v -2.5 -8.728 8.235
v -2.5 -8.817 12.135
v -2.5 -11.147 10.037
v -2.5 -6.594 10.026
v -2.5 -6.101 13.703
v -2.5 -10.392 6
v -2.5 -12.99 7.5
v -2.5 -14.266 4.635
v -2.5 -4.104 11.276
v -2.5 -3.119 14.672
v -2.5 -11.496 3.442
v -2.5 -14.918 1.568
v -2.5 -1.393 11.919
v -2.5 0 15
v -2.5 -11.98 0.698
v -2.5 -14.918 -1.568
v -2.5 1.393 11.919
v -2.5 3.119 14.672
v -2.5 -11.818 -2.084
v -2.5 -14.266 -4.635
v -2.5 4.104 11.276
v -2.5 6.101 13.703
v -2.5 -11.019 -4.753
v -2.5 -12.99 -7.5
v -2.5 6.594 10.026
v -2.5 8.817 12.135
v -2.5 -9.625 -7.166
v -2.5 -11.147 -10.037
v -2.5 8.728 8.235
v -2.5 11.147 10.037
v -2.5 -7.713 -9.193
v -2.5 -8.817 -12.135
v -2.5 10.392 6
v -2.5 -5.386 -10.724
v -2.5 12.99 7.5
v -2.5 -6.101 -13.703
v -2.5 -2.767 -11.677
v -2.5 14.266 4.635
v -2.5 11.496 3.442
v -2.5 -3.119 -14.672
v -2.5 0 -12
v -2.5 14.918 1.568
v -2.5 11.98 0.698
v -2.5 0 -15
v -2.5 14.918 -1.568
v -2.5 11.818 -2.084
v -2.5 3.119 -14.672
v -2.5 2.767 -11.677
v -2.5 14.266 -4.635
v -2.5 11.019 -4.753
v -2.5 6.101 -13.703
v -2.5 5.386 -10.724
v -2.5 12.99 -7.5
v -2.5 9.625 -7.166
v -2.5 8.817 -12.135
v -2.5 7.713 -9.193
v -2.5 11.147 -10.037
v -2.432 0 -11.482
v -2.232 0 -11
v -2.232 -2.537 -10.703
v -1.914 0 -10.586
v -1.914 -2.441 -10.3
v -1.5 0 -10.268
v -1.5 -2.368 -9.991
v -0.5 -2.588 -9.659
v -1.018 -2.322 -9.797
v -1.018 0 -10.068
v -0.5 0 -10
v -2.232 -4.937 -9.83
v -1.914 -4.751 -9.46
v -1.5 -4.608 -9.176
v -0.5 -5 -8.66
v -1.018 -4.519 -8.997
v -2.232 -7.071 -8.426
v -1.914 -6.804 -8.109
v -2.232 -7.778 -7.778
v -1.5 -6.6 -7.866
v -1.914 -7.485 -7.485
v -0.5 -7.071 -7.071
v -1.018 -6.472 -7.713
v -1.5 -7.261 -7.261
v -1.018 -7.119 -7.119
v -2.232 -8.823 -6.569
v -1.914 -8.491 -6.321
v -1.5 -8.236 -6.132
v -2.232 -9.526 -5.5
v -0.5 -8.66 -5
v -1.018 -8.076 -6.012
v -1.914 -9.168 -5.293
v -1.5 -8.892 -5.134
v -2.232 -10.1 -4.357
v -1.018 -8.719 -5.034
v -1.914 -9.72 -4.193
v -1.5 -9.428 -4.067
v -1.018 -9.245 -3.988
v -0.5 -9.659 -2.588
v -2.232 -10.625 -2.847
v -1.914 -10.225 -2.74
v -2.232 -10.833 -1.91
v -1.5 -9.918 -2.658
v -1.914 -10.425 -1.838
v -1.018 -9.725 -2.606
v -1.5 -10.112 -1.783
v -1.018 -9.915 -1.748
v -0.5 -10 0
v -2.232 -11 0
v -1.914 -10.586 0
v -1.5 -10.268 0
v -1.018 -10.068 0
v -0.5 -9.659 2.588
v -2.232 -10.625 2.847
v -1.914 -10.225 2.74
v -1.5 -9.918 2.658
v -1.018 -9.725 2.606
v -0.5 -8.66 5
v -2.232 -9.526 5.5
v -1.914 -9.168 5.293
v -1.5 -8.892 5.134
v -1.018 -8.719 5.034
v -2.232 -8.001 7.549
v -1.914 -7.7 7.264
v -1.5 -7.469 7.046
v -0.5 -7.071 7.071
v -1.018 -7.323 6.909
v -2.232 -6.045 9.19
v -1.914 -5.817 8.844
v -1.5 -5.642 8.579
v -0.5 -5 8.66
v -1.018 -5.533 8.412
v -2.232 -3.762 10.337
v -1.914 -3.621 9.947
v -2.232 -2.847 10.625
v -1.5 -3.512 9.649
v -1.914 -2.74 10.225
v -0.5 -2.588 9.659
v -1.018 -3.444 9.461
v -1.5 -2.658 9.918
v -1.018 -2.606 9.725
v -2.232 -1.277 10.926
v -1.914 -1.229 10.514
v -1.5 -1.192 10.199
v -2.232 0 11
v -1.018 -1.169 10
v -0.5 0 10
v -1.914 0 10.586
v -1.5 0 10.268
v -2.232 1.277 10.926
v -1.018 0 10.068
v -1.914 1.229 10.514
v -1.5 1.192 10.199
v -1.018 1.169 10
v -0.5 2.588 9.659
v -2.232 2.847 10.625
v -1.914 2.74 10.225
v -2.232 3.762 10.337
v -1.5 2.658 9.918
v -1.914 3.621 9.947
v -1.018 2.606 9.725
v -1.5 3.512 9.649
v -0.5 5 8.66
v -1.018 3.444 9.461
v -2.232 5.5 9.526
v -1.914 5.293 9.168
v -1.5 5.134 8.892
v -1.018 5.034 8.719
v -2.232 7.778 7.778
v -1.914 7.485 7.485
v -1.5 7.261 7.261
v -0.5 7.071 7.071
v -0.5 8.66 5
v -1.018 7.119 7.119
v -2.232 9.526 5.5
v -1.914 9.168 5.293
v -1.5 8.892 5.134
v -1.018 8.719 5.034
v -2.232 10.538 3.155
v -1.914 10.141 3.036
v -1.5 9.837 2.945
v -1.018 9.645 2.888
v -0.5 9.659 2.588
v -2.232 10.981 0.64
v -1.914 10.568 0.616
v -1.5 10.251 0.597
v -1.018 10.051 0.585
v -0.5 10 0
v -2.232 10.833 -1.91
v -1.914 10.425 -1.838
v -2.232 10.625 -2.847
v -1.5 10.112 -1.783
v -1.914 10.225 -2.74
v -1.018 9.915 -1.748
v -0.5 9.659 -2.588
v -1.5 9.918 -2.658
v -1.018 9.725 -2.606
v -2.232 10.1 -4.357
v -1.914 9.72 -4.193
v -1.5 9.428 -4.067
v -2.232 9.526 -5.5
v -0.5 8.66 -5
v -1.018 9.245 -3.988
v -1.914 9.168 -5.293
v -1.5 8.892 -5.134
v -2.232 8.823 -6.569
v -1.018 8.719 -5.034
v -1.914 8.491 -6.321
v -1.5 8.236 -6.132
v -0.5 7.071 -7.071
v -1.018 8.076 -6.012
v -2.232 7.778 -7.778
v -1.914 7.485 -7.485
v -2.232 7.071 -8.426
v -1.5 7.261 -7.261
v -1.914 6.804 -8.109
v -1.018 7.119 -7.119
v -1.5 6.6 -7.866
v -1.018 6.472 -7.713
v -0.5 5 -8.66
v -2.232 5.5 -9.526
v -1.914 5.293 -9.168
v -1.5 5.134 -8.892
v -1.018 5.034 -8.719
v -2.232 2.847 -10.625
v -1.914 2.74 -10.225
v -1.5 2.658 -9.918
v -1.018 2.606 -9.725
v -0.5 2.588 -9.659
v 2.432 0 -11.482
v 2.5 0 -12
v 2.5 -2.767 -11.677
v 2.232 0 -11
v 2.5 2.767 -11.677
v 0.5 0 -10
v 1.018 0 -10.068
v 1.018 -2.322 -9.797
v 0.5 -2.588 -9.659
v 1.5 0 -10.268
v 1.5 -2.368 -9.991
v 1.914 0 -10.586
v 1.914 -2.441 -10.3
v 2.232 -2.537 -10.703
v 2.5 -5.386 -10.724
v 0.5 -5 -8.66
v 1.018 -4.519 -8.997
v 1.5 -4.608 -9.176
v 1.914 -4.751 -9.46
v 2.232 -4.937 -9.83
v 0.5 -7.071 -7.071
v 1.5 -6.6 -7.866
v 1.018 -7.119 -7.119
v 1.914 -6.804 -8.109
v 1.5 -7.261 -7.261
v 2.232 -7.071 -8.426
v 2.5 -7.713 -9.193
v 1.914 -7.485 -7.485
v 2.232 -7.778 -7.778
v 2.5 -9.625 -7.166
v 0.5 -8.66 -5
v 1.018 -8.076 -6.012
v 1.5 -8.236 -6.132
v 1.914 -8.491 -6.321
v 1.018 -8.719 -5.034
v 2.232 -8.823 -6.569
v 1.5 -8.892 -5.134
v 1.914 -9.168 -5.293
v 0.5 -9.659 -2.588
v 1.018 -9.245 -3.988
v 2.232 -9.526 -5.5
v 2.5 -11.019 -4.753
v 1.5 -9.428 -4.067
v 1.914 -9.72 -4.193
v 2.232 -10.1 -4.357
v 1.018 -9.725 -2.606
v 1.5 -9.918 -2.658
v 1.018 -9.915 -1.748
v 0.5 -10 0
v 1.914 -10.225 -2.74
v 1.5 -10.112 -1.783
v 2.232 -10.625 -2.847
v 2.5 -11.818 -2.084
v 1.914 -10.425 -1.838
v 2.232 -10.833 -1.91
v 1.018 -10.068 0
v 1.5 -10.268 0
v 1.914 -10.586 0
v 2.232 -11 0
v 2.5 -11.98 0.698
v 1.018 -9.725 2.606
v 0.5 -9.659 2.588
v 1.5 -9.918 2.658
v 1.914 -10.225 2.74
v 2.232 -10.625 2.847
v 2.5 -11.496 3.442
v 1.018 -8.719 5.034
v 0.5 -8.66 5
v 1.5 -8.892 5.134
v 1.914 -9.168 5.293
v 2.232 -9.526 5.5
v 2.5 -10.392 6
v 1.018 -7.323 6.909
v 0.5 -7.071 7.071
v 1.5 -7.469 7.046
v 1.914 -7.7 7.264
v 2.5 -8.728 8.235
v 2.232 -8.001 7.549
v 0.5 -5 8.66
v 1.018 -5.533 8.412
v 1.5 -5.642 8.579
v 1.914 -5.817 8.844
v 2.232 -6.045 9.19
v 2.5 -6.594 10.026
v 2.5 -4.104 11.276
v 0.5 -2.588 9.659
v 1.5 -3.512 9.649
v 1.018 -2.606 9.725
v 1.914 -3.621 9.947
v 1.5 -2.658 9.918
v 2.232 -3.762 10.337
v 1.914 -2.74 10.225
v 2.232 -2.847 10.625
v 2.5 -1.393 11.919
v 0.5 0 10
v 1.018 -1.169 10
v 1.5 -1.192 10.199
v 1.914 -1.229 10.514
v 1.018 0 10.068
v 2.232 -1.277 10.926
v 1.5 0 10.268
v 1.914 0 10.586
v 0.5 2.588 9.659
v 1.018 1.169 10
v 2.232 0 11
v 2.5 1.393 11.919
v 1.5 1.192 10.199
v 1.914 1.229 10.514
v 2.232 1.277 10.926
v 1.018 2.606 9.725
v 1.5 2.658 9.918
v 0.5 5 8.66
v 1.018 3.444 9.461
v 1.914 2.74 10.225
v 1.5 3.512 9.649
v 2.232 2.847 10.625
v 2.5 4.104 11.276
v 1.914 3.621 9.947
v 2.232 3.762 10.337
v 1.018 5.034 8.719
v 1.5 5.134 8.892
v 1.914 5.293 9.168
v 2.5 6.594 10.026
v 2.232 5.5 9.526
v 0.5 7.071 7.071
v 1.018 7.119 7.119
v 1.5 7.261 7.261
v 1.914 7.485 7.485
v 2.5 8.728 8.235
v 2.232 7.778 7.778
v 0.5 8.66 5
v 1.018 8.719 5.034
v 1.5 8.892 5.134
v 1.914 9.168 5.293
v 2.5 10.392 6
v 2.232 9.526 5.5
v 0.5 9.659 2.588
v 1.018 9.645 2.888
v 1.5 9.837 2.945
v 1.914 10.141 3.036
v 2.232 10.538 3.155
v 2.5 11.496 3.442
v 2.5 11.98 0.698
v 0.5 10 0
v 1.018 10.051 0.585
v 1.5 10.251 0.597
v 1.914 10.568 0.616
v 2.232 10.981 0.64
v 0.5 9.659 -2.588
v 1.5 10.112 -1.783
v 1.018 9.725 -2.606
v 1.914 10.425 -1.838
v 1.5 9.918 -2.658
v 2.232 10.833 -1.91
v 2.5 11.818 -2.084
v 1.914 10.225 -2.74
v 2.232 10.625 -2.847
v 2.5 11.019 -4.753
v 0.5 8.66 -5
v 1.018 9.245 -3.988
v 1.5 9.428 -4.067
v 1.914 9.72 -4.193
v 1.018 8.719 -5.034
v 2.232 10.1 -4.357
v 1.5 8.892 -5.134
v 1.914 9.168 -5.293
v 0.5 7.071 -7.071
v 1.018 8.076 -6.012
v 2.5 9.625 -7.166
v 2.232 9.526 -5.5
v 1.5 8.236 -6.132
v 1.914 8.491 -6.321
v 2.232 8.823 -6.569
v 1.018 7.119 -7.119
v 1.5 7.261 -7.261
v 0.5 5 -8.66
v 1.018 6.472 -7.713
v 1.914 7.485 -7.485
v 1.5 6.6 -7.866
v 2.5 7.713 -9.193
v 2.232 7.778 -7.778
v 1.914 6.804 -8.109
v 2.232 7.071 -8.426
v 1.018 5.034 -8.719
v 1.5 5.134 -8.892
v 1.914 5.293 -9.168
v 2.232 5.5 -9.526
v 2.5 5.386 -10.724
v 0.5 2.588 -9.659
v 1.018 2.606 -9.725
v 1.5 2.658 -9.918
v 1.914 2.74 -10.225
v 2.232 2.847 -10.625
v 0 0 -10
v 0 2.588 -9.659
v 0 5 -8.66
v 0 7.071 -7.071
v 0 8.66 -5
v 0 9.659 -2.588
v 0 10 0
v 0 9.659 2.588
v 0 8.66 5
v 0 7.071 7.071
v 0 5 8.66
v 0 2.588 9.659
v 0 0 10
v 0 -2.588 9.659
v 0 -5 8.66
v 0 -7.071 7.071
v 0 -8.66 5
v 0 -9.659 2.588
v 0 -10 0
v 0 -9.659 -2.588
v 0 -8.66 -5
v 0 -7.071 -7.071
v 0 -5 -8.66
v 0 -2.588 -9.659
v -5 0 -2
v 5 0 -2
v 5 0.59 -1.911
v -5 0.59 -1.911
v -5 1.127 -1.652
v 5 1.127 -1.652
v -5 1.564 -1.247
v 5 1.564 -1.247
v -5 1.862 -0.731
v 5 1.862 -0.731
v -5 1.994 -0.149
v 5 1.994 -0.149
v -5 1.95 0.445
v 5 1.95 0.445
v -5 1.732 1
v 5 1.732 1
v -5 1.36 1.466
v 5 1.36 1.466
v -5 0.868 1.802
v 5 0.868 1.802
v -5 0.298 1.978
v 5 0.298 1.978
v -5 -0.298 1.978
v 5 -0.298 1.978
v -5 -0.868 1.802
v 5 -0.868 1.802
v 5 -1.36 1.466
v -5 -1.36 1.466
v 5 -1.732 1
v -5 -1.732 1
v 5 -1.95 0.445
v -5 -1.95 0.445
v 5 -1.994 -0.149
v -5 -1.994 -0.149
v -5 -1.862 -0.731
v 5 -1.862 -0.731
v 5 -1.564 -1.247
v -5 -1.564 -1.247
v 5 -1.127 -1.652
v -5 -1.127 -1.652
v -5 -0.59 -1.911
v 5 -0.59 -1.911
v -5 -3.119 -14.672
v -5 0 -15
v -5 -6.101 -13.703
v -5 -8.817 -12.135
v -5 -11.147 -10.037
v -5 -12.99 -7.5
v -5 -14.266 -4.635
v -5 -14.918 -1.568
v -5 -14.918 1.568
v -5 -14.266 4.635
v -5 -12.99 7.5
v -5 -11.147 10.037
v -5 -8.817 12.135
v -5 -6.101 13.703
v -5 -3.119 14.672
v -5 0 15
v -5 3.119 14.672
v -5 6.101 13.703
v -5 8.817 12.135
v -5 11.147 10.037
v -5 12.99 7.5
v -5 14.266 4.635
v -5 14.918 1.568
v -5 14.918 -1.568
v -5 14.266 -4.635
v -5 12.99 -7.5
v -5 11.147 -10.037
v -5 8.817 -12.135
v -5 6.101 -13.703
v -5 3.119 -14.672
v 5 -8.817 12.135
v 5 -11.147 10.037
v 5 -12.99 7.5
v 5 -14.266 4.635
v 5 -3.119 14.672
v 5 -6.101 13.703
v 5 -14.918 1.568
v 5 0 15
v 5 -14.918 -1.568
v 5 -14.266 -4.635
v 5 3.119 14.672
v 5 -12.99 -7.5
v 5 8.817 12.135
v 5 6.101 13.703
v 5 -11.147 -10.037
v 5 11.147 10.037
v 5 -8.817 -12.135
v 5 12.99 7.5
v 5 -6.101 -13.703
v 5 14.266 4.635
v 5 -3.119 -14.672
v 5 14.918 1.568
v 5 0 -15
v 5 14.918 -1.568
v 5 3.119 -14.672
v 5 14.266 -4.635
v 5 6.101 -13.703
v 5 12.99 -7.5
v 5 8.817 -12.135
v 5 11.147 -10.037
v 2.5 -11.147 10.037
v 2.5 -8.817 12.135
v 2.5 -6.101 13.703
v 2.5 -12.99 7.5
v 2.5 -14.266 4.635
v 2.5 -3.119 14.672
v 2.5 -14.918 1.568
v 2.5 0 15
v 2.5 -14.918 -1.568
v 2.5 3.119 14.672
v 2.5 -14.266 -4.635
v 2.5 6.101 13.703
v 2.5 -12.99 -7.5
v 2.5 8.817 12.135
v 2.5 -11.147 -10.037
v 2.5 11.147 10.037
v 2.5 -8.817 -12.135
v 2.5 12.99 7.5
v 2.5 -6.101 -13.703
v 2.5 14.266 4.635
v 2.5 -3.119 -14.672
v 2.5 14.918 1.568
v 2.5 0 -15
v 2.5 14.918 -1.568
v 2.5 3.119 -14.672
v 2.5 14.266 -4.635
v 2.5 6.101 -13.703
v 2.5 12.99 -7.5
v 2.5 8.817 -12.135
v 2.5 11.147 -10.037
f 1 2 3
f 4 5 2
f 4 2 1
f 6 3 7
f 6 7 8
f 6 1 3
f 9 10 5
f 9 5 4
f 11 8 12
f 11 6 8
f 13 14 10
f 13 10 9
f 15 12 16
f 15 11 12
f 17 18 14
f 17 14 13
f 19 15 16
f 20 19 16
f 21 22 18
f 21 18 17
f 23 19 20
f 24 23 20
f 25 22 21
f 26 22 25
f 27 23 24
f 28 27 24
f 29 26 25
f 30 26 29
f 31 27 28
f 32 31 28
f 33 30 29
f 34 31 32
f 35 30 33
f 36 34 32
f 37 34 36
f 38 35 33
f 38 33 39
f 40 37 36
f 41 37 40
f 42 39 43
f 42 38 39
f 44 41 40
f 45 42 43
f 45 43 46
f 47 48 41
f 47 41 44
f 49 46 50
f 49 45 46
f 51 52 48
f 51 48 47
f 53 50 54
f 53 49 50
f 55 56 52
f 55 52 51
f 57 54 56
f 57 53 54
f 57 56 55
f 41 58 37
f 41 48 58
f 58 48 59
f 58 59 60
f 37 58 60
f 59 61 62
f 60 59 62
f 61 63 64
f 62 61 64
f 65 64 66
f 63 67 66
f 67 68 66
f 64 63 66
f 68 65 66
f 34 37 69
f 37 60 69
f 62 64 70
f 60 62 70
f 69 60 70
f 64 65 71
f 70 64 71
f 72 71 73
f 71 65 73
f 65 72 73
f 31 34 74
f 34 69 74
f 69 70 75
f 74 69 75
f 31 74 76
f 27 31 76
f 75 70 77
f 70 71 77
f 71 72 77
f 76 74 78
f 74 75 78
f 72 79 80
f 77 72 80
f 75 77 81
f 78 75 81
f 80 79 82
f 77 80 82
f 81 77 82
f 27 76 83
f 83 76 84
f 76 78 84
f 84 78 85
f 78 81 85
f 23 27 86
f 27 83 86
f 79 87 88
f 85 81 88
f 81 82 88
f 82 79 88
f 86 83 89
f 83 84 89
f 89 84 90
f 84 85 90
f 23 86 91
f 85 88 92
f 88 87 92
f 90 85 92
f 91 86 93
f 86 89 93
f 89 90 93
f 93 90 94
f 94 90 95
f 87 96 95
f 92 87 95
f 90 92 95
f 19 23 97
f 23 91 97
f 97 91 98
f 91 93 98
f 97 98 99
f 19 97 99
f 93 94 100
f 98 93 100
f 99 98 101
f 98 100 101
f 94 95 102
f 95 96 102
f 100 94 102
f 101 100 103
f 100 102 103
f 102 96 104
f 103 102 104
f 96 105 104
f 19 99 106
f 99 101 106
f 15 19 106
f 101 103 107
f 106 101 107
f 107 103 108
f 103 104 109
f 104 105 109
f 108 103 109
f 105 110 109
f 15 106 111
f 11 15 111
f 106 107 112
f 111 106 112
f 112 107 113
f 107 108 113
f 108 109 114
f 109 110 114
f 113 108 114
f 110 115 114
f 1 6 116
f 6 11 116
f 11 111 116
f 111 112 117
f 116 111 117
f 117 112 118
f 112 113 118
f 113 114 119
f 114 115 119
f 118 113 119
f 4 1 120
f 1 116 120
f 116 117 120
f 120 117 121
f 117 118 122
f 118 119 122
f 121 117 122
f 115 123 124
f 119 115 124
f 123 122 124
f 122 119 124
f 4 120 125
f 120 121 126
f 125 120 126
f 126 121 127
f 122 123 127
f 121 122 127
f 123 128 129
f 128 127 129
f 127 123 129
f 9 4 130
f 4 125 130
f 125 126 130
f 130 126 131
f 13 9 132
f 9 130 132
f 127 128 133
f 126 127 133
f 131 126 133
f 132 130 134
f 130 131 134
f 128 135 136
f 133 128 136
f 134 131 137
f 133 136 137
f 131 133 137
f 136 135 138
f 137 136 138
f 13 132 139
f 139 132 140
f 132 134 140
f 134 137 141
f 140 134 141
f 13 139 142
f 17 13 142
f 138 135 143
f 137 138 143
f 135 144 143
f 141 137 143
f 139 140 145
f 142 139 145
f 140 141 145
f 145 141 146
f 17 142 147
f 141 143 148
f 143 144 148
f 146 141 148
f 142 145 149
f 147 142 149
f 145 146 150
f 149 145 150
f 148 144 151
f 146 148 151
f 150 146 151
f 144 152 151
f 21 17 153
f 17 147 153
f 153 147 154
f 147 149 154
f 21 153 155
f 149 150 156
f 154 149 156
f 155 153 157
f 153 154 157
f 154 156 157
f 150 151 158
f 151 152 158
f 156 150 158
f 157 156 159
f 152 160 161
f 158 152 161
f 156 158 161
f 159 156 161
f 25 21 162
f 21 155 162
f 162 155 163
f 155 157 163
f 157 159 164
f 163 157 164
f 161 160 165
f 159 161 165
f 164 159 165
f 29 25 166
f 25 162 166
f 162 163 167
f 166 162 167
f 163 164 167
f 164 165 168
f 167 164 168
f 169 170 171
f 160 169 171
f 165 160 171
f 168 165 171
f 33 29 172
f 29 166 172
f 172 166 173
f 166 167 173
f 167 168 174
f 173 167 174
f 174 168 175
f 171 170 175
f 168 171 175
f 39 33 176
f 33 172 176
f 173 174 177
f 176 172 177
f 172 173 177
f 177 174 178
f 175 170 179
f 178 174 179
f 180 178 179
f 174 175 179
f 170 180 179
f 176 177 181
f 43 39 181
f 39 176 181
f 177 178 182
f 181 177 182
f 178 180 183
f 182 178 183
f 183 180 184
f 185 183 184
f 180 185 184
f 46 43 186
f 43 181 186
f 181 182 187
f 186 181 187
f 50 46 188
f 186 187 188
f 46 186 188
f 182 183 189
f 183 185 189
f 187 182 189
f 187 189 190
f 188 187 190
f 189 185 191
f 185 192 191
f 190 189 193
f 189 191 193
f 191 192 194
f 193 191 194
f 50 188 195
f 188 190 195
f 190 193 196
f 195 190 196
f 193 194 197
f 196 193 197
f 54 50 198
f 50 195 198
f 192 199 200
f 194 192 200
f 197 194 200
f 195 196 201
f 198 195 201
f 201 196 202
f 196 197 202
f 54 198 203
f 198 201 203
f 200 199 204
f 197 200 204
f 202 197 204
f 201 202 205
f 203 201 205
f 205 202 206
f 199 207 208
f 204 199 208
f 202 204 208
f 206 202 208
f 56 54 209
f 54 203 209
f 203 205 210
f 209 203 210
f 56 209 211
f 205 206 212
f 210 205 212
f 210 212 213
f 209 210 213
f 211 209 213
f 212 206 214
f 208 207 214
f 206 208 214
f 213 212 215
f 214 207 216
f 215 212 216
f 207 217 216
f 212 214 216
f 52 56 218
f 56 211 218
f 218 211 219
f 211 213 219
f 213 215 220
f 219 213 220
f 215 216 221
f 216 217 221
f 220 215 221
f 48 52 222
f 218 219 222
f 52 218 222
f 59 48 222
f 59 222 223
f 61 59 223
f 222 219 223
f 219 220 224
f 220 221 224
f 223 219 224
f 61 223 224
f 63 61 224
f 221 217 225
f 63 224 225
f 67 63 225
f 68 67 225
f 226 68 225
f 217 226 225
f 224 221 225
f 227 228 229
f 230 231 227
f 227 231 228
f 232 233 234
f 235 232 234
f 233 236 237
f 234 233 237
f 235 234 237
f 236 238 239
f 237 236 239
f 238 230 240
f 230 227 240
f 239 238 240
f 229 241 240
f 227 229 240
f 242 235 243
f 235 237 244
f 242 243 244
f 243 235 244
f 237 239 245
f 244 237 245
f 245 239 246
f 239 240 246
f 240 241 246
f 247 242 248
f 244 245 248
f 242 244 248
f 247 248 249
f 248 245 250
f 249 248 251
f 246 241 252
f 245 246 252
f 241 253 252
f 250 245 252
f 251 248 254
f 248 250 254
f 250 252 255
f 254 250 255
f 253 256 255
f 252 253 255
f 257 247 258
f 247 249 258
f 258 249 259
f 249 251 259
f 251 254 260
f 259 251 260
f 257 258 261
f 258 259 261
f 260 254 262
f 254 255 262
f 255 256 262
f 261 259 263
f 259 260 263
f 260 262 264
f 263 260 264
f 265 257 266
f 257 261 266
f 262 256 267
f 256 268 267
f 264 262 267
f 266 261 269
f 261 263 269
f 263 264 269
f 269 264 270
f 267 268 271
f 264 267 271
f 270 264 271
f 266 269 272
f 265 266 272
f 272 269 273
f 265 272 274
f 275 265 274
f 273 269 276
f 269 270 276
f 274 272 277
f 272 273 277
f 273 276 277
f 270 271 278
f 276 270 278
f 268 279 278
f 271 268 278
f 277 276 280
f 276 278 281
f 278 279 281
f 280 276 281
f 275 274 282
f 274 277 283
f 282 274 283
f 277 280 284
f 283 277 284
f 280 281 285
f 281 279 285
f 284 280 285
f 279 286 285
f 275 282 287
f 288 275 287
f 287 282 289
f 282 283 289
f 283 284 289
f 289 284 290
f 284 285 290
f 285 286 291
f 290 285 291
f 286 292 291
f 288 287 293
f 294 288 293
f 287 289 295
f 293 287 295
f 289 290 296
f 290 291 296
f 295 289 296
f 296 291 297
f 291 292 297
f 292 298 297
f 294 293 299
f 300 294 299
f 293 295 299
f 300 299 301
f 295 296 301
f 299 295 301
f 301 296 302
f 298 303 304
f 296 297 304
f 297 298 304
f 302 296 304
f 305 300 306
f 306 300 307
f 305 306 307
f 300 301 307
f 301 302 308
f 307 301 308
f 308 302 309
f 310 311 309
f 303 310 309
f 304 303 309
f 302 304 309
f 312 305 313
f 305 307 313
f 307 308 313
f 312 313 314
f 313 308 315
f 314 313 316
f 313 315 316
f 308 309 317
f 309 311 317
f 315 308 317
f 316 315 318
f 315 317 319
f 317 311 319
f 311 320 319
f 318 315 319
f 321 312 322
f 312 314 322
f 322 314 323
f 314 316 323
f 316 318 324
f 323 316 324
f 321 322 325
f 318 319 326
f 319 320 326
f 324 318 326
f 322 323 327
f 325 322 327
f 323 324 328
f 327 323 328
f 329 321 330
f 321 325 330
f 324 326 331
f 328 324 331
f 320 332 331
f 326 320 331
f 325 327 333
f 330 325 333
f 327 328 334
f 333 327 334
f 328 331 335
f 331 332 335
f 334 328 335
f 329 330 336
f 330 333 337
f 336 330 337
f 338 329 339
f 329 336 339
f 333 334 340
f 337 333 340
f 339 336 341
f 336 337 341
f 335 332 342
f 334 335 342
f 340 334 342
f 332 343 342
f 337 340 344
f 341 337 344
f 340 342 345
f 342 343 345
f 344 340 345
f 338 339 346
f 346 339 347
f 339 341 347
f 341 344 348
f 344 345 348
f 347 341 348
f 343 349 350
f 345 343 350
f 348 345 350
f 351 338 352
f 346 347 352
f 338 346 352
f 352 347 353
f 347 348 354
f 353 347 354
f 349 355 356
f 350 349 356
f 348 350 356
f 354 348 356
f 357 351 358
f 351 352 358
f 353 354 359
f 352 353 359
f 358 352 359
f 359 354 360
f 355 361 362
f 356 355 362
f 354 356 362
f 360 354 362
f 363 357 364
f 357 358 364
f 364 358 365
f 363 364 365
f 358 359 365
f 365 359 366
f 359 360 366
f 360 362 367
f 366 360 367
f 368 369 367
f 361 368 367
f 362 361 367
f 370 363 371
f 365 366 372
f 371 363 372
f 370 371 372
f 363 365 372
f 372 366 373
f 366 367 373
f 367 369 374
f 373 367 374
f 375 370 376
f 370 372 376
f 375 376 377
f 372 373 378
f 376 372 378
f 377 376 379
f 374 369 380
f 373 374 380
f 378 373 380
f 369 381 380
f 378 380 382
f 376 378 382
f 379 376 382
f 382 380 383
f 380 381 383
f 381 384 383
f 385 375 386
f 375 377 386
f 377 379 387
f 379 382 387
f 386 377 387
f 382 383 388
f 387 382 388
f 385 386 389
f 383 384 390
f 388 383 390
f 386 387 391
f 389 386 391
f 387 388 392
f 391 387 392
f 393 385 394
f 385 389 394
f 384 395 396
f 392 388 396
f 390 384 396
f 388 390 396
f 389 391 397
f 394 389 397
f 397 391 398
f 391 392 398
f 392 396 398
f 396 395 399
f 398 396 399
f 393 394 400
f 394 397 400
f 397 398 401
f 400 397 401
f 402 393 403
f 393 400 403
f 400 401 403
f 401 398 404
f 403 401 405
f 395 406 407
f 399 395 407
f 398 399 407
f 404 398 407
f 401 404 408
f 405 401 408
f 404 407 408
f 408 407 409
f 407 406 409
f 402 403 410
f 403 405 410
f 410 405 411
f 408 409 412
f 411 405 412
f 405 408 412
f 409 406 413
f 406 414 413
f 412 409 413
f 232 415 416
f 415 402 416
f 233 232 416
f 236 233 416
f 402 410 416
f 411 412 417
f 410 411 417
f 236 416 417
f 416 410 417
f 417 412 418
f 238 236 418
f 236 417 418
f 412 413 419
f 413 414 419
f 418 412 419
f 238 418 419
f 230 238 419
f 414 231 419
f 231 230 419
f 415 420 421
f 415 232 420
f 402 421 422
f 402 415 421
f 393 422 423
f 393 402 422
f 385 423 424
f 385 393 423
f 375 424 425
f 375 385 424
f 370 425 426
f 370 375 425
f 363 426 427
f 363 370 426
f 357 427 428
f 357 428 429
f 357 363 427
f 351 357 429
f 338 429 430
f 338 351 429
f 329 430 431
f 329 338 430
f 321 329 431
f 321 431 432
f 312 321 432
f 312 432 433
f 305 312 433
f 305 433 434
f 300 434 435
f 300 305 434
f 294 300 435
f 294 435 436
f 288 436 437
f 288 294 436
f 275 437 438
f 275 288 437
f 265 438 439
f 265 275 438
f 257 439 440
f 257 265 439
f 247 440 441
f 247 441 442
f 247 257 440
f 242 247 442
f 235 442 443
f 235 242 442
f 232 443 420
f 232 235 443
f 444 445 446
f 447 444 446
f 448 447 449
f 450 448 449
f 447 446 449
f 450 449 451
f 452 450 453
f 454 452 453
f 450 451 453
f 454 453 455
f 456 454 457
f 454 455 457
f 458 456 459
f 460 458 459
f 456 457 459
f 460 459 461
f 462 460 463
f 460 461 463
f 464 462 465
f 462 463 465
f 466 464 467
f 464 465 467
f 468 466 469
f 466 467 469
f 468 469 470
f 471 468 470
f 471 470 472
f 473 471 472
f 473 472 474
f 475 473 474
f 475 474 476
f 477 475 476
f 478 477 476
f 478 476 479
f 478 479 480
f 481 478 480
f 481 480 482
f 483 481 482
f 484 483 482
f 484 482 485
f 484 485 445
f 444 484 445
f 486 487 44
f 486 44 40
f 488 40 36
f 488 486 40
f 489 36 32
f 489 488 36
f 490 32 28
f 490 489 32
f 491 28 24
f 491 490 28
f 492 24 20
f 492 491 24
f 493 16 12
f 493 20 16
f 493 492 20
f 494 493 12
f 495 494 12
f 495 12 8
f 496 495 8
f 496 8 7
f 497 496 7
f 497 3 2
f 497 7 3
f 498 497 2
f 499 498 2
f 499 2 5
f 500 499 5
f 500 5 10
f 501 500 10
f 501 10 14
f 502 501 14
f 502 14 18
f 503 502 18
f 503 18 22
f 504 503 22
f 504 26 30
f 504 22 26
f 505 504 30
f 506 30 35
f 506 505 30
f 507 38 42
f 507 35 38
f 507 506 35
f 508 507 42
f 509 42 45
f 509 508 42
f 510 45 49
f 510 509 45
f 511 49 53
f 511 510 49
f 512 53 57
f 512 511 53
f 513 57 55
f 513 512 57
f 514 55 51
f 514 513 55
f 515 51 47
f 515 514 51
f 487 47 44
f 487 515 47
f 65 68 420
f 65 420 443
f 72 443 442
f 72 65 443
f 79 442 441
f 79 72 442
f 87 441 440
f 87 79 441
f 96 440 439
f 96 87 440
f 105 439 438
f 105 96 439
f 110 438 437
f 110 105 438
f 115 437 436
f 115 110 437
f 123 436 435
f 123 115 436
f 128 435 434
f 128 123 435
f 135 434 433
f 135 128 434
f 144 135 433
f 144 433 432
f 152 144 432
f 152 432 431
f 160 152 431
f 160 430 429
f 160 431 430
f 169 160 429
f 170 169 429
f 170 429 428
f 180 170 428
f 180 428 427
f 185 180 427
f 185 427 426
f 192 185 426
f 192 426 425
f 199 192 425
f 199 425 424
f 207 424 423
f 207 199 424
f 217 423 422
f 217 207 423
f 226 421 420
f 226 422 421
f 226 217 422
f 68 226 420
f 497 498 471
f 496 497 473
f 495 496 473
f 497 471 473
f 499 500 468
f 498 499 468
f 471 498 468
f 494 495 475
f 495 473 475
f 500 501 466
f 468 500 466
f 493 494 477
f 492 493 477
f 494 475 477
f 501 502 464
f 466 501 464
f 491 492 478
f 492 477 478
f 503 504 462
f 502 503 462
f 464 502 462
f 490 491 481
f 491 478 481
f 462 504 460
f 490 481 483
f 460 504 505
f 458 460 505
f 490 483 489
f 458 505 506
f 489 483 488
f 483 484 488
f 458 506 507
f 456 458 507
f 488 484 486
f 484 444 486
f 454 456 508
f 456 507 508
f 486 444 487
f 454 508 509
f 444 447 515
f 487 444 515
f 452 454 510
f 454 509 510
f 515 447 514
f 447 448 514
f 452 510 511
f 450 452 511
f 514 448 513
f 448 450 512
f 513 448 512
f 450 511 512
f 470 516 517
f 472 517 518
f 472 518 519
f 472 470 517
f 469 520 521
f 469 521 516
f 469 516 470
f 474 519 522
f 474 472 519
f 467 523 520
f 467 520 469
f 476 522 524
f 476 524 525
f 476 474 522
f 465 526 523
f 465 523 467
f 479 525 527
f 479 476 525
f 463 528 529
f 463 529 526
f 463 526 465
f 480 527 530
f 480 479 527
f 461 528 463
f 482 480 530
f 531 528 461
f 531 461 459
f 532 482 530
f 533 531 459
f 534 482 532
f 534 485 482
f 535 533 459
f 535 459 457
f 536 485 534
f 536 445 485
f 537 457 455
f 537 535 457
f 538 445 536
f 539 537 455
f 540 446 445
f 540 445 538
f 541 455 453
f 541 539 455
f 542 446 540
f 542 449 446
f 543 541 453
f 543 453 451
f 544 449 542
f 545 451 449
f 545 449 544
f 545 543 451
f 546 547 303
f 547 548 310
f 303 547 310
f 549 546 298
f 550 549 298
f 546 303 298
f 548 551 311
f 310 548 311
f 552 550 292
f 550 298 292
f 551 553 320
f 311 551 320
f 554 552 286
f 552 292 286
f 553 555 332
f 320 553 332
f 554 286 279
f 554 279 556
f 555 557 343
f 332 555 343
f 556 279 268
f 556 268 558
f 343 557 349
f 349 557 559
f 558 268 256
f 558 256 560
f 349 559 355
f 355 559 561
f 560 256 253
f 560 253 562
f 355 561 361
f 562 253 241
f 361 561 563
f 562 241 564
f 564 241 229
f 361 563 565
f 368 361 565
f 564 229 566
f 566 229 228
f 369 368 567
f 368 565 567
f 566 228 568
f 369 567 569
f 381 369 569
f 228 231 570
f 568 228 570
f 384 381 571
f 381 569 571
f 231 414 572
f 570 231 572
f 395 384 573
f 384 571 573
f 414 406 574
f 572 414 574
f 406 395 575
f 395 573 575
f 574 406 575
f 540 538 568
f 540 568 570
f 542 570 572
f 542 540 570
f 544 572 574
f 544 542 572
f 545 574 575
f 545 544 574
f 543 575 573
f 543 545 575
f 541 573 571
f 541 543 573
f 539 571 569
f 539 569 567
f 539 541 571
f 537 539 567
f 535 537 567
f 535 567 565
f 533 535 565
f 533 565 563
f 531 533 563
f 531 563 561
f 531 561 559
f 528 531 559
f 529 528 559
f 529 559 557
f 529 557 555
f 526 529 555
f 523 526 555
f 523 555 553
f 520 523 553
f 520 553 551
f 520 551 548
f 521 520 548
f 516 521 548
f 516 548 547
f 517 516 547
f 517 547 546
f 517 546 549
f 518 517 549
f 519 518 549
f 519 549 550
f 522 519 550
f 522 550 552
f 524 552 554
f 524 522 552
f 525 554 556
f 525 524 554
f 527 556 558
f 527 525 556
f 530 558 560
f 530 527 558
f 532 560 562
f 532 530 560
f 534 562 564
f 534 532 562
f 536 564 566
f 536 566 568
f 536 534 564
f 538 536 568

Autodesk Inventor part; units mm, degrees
ref_plane "YZ Plane" through (0, 0, 0) normal (1, 0, 0) x (0, 1, 0)
ref_plane "XZ Plane" through (0, 0, 0) normal (0, 1, 0) x (-1, 0, 0)
ref_plane "XY Plane" through (0, 0, 0) normal (0, 0, 1) x (1, 0, 0)
sketch "Sketch1" plane through (0, 0, 0) normal (0, 1, 0) x (-1, 0, 0)
  line L0 (0, 0) -> (0, -10) construction
  line L1 (0, -10) -> (2.5, -10)
  line L2 (2.5, -10) -> (2.5, -15)
  line L3 (2.5, -15) -> (5, -15)
  line L4 (5, -15) -> (5, -2)
  line L5 (5, 0) -> (0, 0) construction
  line L6 (0, -10) -> (-2.5, -10)
  line L7 (-2.5, -10) -> (-2.5, -15)
  line L8 (-2.5, -15) -> (-5, -15)
  line L9 (-5, -15) -> (-5, -2)
  line L10 (-5, 0) -> (0, 0) construction
  line L11 (5, 0) -> (5, -2) construction
  line L12 (5, -2) -> (-5, -2)
  dimension "d1" = 10
  dimension "d2" = 2.5
  dimension "d3" = 5
  dimension "d4" = 2.5
  dimension "d7" = 2
revolve "Revolution1" add sketch "Sketch1" angle 360 about axis through (-5, 0, 0) along (1, 0, 0)
fillet "Fillet1" radius 2 2 edges at (-2.5, 0, 10) (2.5, 0, 10)
properties part number "Align_Roller"
